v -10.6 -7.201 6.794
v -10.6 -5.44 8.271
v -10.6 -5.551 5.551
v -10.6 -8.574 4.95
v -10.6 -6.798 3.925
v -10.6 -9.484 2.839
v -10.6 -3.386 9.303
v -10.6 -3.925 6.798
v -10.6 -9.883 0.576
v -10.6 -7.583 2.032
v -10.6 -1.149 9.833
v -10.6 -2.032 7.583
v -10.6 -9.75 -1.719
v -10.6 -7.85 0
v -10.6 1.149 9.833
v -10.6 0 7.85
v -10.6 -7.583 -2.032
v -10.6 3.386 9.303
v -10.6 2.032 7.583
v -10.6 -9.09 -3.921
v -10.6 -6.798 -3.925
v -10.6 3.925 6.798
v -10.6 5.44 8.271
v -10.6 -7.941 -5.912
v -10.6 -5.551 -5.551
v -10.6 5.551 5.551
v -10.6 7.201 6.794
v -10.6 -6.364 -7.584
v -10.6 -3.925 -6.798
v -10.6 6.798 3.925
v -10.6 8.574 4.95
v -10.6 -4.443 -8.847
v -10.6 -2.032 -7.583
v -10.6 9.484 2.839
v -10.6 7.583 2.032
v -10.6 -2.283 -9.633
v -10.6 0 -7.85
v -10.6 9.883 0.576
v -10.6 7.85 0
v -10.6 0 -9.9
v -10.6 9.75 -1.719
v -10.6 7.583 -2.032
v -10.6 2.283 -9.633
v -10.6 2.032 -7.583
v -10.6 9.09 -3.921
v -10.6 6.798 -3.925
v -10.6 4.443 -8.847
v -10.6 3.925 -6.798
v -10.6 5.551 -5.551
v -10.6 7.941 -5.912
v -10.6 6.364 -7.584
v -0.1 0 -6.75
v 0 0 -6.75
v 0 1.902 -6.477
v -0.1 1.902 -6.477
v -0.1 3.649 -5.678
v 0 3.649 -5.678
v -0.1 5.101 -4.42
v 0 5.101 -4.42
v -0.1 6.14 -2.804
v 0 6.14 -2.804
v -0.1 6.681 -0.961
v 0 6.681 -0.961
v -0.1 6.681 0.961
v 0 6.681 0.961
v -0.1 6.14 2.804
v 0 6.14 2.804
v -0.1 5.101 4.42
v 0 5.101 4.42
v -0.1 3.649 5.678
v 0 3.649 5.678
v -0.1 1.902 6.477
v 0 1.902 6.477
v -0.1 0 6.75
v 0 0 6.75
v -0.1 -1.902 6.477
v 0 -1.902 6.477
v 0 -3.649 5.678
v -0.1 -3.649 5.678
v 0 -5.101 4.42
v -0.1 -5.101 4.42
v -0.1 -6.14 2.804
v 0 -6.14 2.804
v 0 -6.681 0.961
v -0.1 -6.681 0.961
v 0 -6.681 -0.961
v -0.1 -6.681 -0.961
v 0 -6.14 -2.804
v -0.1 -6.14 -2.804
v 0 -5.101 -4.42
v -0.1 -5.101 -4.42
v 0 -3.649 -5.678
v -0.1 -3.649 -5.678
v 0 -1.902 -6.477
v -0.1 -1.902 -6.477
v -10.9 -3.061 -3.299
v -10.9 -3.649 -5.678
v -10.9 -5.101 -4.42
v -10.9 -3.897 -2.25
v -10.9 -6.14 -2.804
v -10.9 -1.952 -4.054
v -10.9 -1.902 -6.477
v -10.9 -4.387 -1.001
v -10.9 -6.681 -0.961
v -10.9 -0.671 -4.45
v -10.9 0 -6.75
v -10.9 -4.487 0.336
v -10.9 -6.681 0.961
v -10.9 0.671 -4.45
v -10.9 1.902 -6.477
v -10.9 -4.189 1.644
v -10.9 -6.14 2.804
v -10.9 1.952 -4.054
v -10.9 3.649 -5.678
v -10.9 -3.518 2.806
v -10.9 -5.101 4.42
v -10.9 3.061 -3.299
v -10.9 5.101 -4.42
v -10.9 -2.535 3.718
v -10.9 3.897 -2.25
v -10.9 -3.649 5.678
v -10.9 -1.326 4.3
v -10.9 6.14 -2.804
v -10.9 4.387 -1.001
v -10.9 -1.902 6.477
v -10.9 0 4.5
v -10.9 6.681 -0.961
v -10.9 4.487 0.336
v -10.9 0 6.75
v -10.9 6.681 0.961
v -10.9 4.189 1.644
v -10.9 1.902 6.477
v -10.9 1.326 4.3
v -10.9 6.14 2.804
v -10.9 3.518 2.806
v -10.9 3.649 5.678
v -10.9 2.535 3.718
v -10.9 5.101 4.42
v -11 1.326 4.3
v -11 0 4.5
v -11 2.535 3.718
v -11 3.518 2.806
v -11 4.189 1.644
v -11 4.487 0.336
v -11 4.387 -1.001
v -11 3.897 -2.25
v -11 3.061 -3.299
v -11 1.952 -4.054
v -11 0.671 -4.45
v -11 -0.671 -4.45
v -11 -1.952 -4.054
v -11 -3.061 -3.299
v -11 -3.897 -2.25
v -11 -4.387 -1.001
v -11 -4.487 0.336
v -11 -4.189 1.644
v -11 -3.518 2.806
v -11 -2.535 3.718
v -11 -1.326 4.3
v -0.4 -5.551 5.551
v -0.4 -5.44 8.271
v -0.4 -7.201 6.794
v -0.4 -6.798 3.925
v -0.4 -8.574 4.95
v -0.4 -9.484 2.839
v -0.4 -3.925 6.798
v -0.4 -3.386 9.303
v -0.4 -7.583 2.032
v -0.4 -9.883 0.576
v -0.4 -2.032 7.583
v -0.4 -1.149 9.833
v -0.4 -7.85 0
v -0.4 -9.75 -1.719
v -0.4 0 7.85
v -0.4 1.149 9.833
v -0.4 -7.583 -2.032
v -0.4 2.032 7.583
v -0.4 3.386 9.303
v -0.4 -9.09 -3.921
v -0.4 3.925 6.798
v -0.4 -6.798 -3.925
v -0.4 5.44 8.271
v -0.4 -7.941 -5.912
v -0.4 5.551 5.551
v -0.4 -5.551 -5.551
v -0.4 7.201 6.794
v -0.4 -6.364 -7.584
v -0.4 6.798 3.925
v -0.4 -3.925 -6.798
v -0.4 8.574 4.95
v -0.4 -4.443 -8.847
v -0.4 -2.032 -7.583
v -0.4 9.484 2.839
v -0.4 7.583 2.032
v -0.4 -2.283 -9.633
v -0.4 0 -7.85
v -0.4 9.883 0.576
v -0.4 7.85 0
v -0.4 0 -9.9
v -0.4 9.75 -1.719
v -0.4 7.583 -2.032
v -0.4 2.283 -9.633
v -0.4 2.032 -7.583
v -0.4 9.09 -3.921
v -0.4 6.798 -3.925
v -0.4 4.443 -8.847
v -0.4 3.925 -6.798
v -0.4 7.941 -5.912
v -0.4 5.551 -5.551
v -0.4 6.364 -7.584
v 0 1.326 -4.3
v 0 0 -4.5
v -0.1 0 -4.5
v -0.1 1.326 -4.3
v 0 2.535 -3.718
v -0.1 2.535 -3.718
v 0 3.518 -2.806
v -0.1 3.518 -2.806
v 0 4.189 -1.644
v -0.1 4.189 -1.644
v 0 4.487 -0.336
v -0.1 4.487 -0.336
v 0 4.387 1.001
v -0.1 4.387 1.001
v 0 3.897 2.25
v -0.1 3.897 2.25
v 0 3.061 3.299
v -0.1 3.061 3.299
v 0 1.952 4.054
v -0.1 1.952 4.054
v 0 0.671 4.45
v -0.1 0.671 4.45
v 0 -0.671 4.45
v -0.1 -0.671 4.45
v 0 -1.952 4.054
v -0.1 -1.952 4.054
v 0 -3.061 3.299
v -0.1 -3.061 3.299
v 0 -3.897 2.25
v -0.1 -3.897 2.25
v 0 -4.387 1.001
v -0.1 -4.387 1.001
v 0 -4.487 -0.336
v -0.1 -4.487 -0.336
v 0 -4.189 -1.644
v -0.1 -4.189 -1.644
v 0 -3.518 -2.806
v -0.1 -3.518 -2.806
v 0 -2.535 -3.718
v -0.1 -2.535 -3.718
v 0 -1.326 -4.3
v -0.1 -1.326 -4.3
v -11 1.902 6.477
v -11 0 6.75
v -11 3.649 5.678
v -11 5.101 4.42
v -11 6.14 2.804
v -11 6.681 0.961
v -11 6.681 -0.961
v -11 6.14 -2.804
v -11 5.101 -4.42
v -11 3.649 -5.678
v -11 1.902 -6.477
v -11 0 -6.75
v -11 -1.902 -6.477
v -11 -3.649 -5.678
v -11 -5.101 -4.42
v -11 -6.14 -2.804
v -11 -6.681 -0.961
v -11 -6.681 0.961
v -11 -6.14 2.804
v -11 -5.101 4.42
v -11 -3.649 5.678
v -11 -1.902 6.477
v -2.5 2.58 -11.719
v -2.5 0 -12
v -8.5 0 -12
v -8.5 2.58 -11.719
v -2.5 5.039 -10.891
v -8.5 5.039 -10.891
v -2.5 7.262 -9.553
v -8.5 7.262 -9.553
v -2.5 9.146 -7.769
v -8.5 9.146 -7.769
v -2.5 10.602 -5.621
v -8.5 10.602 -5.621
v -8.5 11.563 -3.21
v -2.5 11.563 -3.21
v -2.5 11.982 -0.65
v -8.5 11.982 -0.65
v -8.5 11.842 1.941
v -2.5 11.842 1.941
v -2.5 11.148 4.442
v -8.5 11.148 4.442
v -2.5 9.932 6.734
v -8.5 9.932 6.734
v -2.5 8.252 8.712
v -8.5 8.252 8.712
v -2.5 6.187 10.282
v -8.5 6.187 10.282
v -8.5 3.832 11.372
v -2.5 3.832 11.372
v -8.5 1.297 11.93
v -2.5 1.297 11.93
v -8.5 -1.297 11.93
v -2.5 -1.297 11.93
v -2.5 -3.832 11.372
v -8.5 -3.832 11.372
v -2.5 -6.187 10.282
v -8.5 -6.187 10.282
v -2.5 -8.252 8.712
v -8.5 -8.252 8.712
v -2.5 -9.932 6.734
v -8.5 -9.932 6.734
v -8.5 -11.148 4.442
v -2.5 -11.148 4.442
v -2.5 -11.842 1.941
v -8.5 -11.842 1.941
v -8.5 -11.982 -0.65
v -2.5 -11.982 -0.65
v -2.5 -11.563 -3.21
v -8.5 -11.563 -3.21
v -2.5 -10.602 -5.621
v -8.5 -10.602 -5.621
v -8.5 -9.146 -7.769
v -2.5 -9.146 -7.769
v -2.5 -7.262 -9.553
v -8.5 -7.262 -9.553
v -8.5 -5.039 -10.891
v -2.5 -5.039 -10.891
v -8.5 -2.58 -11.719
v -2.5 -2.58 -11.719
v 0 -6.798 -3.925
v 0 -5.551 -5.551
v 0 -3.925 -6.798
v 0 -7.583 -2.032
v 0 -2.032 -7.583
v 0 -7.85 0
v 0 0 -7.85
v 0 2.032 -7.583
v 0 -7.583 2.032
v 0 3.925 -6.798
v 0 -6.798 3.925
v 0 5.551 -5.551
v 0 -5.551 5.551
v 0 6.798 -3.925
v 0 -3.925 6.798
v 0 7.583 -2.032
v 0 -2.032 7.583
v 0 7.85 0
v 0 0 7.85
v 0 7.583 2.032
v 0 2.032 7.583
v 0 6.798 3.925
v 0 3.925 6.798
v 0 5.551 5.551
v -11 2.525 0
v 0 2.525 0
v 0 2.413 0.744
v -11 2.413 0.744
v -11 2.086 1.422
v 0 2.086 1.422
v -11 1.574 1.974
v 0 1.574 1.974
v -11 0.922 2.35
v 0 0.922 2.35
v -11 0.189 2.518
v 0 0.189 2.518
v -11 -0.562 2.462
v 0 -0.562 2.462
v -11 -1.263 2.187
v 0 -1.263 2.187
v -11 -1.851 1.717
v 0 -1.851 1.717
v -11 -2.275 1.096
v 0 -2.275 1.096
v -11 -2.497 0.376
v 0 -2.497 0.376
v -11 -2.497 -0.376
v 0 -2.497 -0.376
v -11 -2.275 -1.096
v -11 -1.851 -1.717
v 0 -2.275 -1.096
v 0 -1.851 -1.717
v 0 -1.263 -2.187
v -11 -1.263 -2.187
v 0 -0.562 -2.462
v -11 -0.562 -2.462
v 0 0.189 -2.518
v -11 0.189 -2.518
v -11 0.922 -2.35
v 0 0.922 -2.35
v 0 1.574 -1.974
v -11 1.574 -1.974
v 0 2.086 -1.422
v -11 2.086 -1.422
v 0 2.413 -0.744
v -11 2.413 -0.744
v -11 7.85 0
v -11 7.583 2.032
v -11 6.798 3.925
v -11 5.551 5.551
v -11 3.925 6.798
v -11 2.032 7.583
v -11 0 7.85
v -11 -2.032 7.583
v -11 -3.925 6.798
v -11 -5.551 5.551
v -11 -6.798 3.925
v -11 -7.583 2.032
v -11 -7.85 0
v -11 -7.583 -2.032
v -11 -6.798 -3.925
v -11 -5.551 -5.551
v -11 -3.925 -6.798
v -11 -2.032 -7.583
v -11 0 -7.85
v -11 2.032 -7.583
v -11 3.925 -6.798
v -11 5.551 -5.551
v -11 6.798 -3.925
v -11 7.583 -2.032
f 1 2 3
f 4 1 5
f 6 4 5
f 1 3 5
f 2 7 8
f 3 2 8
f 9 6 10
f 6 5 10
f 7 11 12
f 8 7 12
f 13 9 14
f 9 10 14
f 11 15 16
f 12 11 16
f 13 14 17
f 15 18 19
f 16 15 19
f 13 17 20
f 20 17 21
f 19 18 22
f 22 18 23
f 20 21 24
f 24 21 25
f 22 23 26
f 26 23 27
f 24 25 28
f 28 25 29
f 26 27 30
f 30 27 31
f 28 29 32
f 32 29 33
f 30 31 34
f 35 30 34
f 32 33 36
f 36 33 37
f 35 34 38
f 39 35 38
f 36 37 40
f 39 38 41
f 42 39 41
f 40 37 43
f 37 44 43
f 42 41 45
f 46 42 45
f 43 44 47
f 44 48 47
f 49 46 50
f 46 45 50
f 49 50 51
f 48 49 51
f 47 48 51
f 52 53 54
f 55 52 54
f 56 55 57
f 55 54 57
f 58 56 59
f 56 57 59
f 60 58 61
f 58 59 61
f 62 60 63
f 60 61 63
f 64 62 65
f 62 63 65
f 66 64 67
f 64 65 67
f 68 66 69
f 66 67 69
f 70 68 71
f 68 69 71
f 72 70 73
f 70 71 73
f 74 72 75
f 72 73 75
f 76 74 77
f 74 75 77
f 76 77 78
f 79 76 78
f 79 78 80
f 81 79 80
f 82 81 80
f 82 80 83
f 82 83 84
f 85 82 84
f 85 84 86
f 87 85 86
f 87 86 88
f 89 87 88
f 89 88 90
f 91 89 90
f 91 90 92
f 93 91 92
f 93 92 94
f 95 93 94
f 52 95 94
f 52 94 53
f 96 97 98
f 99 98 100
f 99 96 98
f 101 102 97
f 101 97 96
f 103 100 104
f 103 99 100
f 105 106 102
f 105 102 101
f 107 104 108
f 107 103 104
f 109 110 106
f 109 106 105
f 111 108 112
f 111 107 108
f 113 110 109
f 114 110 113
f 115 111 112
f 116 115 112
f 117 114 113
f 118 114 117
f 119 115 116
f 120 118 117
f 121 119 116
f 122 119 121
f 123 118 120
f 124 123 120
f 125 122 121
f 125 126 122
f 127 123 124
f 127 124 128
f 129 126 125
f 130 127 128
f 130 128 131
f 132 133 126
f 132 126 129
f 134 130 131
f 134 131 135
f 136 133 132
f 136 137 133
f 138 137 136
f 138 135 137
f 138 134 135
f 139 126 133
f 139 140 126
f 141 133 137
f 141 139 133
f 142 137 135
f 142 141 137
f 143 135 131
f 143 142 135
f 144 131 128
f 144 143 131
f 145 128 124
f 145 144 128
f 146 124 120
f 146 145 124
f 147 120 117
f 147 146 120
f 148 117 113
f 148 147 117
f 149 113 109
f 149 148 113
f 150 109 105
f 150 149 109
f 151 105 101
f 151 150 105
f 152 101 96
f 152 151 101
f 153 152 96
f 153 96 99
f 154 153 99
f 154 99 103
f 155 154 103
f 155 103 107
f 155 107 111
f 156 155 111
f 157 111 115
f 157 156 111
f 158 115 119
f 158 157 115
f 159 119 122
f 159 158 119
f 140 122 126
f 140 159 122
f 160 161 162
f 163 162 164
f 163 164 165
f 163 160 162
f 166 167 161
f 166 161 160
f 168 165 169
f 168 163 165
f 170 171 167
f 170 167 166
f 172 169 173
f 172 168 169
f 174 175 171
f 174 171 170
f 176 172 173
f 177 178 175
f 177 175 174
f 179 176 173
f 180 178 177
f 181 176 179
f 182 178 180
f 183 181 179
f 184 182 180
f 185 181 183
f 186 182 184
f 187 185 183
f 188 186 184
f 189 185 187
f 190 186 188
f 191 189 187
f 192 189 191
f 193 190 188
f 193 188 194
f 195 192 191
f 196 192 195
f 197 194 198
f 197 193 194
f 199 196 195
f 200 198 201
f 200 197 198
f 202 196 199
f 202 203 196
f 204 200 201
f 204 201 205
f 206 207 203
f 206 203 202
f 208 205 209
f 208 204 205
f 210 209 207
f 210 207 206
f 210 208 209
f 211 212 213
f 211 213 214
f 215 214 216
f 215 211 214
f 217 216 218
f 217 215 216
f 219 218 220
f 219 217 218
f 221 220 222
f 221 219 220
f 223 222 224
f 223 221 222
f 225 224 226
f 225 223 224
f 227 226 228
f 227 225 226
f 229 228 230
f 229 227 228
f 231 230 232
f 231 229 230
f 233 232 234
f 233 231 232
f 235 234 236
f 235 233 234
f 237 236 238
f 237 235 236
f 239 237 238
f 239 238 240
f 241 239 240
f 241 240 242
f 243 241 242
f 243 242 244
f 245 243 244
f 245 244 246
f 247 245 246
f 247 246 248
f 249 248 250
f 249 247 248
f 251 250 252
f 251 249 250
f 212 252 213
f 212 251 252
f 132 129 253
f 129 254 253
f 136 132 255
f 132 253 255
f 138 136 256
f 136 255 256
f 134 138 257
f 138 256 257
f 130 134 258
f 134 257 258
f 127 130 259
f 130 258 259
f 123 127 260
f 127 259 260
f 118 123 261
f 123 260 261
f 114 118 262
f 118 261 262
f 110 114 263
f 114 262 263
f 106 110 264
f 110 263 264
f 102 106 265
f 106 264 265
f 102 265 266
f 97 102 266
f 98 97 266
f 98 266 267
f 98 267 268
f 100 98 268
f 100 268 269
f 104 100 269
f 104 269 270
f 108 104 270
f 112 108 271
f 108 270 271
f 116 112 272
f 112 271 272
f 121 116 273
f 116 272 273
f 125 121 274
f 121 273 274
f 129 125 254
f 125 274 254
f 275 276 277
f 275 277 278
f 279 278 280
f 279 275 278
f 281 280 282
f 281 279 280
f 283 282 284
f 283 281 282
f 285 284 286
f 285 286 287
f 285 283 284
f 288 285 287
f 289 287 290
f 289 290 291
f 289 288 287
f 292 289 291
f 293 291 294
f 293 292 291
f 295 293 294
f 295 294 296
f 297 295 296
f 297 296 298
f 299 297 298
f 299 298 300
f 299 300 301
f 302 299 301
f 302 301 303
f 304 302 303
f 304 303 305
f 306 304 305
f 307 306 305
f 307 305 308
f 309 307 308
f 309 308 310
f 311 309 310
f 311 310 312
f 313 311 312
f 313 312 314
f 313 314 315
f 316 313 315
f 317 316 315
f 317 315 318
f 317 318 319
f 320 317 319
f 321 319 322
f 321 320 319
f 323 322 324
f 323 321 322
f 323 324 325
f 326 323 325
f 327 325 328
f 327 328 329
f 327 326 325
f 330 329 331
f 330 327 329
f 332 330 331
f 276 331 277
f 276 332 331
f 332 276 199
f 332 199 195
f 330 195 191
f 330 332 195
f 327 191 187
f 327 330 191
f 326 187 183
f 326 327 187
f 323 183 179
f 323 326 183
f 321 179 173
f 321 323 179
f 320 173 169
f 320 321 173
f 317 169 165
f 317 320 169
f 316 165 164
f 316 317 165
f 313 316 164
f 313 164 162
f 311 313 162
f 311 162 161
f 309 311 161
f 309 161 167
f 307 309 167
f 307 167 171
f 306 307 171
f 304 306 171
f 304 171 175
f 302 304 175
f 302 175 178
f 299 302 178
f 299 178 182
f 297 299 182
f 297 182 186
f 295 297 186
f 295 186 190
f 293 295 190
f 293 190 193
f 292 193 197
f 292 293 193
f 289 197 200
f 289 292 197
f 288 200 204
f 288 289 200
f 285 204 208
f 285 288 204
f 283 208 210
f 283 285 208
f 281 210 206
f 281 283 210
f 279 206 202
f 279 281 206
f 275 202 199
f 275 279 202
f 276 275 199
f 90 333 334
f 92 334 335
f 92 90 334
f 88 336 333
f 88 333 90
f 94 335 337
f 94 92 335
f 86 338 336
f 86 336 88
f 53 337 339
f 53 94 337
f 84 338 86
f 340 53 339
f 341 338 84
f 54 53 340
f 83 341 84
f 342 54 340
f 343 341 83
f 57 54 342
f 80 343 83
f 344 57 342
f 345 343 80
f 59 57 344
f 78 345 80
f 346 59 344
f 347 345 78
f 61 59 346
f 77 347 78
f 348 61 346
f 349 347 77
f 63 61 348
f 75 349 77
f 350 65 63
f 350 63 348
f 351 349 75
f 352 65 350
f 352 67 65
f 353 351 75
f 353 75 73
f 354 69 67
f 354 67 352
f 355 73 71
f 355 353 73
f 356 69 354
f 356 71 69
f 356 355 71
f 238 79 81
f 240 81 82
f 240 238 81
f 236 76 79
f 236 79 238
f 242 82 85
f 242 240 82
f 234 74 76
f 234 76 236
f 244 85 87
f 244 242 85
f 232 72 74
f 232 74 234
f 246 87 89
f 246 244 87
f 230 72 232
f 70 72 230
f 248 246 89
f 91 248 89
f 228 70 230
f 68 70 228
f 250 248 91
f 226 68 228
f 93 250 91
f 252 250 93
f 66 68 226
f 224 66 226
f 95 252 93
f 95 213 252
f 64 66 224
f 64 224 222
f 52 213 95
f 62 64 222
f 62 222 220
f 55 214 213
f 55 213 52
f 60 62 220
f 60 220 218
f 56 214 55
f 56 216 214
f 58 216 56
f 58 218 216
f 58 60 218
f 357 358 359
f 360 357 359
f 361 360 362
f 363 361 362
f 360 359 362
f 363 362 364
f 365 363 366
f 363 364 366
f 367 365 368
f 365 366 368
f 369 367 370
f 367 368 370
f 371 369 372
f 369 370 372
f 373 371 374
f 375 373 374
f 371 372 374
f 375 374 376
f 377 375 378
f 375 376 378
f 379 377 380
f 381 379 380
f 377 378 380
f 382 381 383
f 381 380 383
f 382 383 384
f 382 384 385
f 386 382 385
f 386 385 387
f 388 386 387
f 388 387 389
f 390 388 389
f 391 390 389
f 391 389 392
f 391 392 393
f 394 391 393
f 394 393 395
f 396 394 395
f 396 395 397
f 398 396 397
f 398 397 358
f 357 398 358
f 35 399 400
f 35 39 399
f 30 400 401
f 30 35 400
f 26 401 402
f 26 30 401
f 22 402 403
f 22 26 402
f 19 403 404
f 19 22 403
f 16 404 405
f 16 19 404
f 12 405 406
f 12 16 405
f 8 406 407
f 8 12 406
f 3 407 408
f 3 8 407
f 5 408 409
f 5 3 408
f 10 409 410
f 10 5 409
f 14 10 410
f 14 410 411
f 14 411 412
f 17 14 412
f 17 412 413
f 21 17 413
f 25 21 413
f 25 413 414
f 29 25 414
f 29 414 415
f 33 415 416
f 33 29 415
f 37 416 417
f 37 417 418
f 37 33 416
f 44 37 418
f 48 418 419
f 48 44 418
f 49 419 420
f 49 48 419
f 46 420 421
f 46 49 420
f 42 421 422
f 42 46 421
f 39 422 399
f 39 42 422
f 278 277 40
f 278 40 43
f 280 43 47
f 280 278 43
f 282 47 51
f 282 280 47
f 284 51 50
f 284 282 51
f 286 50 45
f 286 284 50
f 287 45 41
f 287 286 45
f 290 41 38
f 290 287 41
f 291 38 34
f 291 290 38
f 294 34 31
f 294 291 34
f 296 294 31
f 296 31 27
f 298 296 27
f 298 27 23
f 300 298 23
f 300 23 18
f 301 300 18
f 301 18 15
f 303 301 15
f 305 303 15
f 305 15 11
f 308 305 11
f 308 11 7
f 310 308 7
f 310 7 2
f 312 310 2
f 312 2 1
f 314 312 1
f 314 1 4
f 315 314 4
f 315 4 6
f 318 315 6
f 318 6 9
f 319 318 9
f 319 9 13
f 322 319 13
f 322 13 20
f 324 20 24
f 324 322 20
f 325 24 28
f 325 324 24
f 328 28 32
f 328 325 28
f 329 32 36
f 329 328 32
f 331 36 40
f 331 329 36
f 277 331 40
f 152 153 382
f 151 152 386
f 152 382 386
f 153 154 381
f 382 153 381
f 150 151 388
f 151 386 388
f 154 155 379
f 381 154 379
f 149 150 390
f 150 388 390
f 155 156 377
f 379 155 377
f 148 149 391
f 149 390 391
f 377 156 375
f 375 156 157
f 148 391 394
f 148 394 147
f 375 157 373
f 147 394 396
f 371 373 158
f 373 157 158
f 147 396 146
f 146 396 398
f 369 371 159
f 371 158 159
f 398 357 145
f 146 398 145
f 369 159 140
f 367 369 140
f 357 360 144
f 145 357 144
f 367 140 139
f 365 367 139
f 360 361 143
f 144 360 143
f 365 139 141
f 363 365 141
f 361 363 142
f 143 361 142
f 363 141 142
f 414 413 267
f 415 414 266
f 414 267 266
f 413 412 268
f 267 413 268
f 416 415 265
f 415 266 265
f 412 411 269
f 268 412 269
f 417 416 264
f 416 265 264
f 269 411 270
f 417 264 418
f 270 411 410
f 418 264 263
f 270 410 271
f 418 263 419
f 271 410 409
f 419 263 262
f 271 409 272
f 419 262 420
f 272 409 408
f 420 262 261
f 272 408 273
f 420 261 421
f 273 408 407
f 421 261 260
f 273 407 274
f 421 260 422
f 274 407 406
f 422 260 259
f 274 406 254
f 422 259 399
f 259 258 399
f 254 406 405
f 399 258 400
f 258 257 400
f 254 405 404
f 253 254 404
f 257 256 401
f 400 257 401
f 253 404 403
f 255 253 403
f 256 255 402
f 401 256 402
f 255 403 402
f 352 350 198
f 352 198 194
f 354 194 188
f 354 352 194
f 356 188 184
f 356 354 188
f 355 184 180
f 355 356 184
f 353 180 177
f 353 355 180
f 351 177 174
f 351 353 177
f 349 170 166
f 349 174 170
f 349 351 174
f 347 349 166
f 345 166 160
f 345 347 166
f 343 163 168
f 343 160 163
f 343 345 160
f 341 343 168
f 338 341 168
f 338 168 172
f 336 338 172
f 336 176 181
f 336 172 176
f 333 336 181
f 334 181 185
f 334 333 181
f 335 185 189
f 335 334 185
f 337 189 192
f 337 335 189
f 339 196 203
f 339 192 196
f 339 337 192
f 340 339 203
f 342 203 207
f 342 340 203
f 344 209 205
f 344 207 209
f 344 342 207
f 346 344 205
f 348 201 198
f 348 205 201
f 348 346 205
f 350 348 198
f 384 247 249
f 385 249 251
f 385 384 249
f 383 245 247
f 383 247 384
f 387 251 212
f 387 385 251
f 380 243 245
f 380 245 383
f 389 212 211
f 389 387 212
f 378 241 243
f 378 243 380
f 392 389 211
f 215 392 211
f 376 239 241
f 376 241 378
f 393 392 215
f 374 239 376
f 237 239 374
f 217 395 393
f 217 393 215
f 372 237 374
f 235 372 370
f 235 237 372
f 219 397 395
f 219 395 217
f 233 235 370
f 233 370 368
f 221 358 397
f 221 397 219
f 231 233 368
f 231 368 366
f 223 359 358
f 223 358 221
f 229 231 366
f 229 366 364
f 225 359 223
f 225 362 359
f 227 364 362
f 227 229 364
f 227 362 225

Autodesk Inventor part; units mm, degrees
ref_plane "YZ Plane" through (0, 0, 0) normal (1, 0, 0) x (0, 1, 0)
ref_plane "XZ Plane" through (0, 0, 0) normal (0, 1, 0) x (-1, 0, 0)
sketch "Sketch1" plane through (0, 0, 0) normal (1, 0, 0) x (0, 1, 0)
  circle A0 centre (0, 0) radius 2.525
  circle A1 centre (0, 0) radius 7.85
  dimension "d0" = 5.05
  dimension "d1" = 15.7
extrude "Extrusion1" add sketch "Sketch1" against normal blind 11
sketch "Sketch2" plane through (0, 0, 0) normal (1, 0, 0) x (0, 0, -1)
  circle A0 centre (0, 0) radius 4.5
  circle A1 centre (0, 0) radius 6.75
  dimension "d4" = 9
  dimension "d5" = 13.5
extrude "Extrusion2" cut sketch "Sketch2" against normal blind 0.1
sketch "Sketch3" plane through (-11, 0, 0) normal (-1, 0, 0) x (0, 0, 1)
  circle A0 centre (0, 0) radius 6.75 projected
  circle A1 centre (0, 0) radius 4.5 projected
extrude "Extrusion3" cut sketch "Sketch3" against normal blind 0.1
ref_plane "Work Plane1" through (-0.4, 0, 0) normal (1, 0, 0) x (0, 0, -1)
sketch "Sketch4" plane through (-0.4, 0, 0) normal (1, 0, 0) x (0, 0, -1)
  circle A0 centre (0, 0) radius 7.85 projected
  circle A1 centre (0, 0) radius 12
  dimension "d11" = 24
extrude "Extrusion4" add sketch "Sketch4" against normal blind 10.2
chamfer "Chamfer1" distance 2.1 angle 45 1 edges at (-0.4, 0, 12) measured on face at (-0.4, -1.2727, -10.4814)
chamfer "Chamfer2" distance 2.1 angle 45 1 edges at (-10.6, 0, 12) measured on face at (-10.6, -1.2727, -10.4814)
properties part number "M5 V Wheel"
